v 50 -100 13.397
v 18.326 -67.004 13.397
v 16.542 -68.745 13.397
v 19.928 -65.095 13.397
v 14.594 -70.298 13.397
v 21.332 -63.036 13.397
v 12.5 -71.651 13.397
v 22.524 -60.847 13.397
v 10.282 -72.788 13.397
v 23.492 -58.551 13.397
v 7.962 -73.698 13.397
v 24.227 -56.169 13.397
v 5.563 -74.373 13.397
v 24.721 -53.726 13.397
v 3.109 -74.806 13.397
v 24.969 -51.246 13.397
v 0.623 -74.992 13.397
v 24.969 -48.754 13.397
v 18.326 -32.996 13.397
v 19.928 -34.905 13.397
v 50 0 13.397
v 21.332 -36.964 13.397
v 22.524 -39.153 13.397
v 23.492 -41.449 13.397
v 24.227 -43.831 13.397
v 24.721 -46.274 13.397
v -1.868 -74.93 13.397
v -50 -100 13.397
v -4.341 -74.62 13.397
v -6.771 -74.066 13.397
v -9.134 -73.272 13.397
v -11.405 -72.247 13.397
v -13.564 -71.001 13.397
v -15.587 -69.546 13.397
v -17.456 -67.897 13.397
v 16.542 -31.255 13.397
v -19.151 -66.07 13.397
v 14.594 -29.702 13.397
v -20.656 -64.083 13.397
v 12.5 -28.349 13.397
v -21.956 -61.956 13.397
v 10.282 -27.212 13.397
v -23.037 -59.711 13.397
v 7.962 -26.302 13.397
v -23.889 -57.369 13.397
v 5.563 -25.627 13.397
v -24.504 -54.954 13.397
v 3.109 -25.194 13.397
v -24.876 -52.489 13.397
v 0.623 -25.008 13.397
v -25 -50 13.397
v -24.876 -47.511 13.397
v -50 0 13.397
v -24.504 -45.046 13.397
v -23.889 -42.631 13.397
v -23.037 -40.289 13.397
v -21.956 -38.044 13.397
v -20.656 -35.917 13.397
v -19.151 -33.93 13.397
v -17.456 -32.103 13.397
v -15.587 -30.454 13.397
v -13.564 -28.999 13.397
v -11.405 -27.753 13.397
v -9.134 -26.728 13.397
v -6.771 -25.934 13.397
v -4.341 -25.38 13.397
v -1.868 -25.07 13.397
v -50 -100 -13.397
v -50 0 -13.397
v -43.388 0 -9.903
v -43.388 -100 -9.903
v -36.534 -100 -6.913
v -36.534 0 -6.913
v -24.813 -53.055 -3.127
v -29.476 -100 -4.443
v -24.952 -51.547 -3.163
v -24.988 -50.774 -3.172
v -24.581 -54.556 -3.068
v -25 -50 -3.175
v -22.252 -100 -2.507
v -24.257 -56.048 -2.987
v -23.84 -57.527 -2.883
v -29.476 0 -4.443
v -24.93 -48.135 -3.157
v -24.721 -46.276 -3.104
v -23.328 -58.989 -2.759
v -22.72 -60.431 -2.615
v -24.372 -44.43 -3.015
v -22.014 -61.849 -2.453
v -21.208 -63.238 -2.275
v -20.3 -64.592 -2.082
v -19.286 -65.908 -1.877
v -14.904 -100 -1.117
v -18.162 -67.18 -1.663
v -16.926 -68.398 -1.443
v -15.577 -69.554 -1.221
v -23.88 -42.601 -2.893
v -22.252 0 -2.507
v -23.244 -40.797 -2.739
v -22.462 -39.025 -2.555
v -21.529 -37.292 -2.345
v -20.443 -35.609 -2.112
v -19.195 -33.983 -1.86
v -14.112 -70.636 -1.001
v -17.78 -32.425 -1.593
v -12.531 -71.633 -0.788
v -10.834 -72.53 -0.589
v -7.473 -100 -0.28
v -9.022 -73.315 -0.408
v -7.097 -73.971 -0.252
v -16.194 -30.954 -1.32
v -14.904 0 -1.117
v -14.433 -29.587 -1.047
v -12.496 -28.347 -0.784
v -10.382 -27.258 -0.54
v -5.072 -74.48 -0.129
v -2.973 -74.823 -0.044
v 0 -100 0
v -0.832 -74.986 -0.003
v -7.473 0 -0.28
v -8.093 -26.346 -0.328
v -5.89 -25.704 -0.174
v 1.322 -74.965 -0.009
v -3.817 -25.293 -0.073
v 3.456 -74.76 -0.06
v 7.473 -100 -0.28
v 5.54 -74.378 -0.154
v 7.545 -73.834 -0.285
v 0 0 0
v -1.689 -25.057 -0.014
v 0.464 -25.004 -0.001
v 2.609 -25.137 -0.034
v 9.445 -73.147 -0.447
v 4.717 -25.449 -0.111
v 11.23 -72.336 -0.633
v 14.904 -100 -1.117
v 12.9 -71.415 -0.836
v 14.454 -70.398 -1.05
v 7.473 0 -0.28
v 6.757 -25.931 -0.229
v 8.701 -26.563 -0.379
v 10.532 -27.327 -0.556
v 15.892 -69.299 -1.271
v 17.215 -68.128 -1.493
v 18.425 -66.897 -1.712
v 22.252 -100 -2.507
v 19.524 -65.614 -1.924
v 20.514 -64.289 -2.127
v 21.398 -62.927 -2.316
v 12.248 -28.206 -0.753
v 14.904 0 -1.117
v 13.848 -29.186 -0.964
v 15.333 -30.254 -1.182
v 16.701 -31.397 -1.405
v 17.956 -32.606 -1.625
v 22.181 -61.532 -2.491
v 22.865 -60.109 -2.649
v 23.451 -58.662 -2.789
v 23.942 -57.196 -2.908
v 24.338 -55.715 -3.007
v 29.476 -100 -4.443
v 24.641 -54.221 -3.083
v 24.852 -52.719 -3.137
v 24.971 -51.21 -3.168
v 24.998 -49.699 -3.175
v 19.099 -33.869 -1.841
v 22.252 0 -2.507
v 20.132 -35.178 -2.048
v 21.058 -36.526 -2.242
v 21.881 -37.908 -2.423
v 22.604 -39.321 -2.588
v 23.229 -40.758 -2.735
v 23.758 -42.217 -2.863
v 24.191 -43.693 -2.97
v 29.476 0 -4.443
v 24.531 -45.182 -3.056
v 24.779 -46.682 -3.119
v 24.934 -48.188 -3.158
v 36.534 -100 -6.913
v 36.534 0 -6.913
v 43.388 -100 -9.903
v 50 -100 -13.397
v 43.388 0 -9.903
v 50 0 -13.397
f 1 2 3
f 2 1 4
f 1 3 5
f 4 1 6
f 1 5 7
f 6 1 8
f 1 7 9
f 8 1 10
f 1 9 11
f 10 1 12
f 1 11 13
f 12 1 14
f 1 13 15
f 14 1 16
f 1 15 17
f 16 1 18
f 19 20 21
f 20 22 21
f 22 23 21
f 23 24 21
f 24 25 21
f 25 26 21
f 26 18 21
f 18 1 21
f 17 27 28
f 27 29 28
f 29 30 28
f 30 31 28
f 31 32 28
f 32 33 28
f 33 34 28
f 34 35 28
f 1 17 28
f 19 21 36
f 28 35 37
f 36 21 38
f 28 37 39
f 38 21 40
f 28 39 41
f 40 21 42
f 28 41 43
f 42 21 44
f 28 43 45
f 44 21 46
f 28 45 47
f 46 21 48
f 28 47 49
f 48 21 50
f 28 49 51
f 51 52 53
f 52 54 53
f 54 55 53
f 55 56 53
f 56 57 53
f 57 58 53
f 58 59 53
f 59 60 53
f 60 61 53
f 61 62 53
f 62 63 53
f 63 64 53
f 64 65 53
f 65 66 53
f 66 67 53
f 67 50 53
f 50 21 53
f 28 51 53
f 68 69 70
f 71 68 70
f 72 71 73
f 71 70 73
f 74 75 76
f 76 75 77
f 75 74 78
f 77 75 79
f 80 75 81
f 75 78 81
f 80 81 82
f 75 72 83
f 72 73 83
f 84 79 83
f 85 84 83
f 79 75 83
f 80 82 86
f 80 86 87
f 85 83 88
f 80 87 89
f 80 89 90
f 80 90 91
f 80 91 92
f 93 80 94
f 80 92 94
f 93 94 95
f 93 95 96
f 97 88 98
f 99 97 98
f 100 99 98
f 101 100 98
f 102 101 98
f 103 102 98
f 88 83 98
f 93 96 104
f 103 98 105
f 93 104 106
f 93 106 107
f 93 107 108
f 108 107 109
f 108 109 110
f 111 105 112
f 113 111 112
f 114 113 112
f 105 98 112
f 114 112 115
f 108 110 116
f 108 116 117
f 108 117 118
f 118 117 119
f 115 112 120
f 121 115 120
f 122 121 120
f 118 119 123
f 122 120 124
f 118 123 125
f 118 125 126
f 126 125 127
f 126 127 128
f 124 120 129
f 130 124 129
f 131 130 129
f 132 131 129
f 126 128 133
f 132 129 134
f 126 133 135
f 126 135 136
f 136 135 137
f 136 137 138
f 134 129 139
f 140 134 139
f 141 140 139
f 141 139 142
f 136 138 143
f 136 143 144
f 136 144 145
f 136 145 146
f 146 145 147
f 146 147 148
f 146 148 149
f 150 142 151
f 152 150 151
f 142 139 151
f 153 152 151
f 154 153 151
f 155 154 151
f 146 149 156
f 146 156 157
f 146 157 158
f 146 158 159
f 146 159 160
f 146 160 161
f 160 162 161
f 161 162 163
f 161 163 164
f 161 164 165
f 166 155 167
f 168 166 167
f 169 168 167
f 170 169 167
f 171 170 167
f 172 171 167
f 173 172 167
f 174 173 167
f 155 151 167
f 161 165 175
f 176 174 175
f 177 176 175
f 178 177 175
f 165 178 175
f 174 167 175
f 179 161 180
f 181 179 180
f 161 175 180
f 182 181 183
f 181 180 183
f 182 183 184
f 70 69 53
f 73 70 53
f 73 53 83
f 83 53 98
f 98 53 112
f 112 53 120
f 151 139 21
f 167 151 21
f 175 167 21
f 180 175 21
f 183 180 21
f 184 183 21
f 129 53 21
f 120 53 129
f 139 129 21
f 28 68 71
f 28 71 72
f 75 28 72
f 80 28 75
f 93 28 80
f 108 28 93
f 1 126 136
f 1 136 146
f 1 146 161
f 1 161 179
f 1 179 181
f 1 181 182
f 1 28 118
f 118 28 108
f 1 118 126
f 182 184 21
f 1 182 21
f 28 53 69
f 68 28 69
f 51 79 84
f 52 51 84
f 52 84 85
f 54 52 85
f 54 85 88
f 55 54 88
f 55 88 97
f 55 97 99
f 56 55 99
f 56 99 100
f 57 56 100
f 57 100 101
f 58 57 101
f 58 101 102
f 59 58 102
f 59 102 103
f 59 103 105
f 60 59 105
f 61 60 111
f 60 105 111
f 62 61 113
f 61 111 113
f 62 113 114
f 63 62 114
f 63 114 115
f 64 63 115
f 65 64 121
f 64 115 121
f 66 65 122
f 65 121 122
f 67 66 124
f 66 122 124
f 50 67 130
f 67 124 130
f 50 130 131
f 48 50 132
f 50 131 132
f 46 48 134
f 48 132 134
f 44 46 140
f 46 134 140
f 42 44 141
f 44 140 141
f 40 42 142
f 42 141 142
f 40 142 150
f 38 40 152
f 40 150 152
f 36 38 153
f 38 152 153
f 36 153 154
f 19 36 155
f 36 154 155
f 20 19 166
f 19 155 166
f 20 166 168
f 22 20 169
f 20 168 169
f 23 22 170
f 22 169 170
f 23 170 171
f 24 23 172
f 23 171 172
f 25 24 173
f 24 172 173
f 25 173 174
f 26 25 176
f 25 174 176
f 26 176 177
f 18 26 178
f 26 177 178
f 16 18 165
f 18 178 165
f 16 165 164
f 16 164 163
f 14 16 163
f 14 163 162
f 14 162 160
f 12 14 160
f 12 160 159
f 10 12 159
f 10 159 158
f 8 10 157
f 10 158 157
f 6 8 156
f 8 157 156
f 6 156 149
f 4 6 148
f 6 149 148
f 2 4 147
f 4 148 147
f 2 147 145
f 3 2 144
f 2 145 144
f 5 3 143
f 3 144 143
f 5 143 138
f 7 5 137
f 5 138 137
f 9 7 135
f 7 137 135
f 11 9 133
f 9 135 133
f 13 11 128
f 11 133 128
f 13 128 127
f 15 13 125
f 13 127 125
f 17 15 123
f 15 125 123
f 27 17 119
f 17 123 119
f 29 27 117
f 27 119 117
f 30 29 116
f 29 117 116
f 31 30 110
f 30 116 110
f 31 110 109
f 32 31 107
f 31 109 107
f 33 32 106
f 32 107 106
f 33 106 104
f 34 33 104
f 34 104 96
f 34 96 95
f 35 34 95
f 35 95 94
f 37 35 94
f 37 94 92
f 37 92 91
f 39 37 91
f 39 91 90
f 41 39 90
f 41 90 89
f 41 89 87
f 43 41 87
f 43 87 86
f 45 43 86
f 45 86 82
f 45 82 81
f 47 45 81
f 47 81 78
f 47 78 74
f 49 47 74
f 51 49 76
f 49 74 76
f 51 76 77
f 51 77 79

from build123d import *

# Parameters (mm, degrees)
F1_DEPTH = 100
F3_D     = 50


with BuildPart() as f1:
    # F0 (on Front) → F1 (new body)
    with BuildSketch(Plane.XZ):
        with BuildLine():
            ThreePointArc((-50, -13.39746), (0, 0), (50, -13.39746))
            Line((50, -13.39746), (50, 13.39746))
            Line((50, 13.39746), (-50, 13.39746))
            Line((-50, 13.39746), (-50, -13.39746))
        make_face()
    extrude(amount=F1_DEPTH)

    # F3 (through all)
    with Locations(Plane.XY.offset(13.39746)):
        with Locations((0, -50)):
            Hole(F3_D / 2)


solid = f1.part
